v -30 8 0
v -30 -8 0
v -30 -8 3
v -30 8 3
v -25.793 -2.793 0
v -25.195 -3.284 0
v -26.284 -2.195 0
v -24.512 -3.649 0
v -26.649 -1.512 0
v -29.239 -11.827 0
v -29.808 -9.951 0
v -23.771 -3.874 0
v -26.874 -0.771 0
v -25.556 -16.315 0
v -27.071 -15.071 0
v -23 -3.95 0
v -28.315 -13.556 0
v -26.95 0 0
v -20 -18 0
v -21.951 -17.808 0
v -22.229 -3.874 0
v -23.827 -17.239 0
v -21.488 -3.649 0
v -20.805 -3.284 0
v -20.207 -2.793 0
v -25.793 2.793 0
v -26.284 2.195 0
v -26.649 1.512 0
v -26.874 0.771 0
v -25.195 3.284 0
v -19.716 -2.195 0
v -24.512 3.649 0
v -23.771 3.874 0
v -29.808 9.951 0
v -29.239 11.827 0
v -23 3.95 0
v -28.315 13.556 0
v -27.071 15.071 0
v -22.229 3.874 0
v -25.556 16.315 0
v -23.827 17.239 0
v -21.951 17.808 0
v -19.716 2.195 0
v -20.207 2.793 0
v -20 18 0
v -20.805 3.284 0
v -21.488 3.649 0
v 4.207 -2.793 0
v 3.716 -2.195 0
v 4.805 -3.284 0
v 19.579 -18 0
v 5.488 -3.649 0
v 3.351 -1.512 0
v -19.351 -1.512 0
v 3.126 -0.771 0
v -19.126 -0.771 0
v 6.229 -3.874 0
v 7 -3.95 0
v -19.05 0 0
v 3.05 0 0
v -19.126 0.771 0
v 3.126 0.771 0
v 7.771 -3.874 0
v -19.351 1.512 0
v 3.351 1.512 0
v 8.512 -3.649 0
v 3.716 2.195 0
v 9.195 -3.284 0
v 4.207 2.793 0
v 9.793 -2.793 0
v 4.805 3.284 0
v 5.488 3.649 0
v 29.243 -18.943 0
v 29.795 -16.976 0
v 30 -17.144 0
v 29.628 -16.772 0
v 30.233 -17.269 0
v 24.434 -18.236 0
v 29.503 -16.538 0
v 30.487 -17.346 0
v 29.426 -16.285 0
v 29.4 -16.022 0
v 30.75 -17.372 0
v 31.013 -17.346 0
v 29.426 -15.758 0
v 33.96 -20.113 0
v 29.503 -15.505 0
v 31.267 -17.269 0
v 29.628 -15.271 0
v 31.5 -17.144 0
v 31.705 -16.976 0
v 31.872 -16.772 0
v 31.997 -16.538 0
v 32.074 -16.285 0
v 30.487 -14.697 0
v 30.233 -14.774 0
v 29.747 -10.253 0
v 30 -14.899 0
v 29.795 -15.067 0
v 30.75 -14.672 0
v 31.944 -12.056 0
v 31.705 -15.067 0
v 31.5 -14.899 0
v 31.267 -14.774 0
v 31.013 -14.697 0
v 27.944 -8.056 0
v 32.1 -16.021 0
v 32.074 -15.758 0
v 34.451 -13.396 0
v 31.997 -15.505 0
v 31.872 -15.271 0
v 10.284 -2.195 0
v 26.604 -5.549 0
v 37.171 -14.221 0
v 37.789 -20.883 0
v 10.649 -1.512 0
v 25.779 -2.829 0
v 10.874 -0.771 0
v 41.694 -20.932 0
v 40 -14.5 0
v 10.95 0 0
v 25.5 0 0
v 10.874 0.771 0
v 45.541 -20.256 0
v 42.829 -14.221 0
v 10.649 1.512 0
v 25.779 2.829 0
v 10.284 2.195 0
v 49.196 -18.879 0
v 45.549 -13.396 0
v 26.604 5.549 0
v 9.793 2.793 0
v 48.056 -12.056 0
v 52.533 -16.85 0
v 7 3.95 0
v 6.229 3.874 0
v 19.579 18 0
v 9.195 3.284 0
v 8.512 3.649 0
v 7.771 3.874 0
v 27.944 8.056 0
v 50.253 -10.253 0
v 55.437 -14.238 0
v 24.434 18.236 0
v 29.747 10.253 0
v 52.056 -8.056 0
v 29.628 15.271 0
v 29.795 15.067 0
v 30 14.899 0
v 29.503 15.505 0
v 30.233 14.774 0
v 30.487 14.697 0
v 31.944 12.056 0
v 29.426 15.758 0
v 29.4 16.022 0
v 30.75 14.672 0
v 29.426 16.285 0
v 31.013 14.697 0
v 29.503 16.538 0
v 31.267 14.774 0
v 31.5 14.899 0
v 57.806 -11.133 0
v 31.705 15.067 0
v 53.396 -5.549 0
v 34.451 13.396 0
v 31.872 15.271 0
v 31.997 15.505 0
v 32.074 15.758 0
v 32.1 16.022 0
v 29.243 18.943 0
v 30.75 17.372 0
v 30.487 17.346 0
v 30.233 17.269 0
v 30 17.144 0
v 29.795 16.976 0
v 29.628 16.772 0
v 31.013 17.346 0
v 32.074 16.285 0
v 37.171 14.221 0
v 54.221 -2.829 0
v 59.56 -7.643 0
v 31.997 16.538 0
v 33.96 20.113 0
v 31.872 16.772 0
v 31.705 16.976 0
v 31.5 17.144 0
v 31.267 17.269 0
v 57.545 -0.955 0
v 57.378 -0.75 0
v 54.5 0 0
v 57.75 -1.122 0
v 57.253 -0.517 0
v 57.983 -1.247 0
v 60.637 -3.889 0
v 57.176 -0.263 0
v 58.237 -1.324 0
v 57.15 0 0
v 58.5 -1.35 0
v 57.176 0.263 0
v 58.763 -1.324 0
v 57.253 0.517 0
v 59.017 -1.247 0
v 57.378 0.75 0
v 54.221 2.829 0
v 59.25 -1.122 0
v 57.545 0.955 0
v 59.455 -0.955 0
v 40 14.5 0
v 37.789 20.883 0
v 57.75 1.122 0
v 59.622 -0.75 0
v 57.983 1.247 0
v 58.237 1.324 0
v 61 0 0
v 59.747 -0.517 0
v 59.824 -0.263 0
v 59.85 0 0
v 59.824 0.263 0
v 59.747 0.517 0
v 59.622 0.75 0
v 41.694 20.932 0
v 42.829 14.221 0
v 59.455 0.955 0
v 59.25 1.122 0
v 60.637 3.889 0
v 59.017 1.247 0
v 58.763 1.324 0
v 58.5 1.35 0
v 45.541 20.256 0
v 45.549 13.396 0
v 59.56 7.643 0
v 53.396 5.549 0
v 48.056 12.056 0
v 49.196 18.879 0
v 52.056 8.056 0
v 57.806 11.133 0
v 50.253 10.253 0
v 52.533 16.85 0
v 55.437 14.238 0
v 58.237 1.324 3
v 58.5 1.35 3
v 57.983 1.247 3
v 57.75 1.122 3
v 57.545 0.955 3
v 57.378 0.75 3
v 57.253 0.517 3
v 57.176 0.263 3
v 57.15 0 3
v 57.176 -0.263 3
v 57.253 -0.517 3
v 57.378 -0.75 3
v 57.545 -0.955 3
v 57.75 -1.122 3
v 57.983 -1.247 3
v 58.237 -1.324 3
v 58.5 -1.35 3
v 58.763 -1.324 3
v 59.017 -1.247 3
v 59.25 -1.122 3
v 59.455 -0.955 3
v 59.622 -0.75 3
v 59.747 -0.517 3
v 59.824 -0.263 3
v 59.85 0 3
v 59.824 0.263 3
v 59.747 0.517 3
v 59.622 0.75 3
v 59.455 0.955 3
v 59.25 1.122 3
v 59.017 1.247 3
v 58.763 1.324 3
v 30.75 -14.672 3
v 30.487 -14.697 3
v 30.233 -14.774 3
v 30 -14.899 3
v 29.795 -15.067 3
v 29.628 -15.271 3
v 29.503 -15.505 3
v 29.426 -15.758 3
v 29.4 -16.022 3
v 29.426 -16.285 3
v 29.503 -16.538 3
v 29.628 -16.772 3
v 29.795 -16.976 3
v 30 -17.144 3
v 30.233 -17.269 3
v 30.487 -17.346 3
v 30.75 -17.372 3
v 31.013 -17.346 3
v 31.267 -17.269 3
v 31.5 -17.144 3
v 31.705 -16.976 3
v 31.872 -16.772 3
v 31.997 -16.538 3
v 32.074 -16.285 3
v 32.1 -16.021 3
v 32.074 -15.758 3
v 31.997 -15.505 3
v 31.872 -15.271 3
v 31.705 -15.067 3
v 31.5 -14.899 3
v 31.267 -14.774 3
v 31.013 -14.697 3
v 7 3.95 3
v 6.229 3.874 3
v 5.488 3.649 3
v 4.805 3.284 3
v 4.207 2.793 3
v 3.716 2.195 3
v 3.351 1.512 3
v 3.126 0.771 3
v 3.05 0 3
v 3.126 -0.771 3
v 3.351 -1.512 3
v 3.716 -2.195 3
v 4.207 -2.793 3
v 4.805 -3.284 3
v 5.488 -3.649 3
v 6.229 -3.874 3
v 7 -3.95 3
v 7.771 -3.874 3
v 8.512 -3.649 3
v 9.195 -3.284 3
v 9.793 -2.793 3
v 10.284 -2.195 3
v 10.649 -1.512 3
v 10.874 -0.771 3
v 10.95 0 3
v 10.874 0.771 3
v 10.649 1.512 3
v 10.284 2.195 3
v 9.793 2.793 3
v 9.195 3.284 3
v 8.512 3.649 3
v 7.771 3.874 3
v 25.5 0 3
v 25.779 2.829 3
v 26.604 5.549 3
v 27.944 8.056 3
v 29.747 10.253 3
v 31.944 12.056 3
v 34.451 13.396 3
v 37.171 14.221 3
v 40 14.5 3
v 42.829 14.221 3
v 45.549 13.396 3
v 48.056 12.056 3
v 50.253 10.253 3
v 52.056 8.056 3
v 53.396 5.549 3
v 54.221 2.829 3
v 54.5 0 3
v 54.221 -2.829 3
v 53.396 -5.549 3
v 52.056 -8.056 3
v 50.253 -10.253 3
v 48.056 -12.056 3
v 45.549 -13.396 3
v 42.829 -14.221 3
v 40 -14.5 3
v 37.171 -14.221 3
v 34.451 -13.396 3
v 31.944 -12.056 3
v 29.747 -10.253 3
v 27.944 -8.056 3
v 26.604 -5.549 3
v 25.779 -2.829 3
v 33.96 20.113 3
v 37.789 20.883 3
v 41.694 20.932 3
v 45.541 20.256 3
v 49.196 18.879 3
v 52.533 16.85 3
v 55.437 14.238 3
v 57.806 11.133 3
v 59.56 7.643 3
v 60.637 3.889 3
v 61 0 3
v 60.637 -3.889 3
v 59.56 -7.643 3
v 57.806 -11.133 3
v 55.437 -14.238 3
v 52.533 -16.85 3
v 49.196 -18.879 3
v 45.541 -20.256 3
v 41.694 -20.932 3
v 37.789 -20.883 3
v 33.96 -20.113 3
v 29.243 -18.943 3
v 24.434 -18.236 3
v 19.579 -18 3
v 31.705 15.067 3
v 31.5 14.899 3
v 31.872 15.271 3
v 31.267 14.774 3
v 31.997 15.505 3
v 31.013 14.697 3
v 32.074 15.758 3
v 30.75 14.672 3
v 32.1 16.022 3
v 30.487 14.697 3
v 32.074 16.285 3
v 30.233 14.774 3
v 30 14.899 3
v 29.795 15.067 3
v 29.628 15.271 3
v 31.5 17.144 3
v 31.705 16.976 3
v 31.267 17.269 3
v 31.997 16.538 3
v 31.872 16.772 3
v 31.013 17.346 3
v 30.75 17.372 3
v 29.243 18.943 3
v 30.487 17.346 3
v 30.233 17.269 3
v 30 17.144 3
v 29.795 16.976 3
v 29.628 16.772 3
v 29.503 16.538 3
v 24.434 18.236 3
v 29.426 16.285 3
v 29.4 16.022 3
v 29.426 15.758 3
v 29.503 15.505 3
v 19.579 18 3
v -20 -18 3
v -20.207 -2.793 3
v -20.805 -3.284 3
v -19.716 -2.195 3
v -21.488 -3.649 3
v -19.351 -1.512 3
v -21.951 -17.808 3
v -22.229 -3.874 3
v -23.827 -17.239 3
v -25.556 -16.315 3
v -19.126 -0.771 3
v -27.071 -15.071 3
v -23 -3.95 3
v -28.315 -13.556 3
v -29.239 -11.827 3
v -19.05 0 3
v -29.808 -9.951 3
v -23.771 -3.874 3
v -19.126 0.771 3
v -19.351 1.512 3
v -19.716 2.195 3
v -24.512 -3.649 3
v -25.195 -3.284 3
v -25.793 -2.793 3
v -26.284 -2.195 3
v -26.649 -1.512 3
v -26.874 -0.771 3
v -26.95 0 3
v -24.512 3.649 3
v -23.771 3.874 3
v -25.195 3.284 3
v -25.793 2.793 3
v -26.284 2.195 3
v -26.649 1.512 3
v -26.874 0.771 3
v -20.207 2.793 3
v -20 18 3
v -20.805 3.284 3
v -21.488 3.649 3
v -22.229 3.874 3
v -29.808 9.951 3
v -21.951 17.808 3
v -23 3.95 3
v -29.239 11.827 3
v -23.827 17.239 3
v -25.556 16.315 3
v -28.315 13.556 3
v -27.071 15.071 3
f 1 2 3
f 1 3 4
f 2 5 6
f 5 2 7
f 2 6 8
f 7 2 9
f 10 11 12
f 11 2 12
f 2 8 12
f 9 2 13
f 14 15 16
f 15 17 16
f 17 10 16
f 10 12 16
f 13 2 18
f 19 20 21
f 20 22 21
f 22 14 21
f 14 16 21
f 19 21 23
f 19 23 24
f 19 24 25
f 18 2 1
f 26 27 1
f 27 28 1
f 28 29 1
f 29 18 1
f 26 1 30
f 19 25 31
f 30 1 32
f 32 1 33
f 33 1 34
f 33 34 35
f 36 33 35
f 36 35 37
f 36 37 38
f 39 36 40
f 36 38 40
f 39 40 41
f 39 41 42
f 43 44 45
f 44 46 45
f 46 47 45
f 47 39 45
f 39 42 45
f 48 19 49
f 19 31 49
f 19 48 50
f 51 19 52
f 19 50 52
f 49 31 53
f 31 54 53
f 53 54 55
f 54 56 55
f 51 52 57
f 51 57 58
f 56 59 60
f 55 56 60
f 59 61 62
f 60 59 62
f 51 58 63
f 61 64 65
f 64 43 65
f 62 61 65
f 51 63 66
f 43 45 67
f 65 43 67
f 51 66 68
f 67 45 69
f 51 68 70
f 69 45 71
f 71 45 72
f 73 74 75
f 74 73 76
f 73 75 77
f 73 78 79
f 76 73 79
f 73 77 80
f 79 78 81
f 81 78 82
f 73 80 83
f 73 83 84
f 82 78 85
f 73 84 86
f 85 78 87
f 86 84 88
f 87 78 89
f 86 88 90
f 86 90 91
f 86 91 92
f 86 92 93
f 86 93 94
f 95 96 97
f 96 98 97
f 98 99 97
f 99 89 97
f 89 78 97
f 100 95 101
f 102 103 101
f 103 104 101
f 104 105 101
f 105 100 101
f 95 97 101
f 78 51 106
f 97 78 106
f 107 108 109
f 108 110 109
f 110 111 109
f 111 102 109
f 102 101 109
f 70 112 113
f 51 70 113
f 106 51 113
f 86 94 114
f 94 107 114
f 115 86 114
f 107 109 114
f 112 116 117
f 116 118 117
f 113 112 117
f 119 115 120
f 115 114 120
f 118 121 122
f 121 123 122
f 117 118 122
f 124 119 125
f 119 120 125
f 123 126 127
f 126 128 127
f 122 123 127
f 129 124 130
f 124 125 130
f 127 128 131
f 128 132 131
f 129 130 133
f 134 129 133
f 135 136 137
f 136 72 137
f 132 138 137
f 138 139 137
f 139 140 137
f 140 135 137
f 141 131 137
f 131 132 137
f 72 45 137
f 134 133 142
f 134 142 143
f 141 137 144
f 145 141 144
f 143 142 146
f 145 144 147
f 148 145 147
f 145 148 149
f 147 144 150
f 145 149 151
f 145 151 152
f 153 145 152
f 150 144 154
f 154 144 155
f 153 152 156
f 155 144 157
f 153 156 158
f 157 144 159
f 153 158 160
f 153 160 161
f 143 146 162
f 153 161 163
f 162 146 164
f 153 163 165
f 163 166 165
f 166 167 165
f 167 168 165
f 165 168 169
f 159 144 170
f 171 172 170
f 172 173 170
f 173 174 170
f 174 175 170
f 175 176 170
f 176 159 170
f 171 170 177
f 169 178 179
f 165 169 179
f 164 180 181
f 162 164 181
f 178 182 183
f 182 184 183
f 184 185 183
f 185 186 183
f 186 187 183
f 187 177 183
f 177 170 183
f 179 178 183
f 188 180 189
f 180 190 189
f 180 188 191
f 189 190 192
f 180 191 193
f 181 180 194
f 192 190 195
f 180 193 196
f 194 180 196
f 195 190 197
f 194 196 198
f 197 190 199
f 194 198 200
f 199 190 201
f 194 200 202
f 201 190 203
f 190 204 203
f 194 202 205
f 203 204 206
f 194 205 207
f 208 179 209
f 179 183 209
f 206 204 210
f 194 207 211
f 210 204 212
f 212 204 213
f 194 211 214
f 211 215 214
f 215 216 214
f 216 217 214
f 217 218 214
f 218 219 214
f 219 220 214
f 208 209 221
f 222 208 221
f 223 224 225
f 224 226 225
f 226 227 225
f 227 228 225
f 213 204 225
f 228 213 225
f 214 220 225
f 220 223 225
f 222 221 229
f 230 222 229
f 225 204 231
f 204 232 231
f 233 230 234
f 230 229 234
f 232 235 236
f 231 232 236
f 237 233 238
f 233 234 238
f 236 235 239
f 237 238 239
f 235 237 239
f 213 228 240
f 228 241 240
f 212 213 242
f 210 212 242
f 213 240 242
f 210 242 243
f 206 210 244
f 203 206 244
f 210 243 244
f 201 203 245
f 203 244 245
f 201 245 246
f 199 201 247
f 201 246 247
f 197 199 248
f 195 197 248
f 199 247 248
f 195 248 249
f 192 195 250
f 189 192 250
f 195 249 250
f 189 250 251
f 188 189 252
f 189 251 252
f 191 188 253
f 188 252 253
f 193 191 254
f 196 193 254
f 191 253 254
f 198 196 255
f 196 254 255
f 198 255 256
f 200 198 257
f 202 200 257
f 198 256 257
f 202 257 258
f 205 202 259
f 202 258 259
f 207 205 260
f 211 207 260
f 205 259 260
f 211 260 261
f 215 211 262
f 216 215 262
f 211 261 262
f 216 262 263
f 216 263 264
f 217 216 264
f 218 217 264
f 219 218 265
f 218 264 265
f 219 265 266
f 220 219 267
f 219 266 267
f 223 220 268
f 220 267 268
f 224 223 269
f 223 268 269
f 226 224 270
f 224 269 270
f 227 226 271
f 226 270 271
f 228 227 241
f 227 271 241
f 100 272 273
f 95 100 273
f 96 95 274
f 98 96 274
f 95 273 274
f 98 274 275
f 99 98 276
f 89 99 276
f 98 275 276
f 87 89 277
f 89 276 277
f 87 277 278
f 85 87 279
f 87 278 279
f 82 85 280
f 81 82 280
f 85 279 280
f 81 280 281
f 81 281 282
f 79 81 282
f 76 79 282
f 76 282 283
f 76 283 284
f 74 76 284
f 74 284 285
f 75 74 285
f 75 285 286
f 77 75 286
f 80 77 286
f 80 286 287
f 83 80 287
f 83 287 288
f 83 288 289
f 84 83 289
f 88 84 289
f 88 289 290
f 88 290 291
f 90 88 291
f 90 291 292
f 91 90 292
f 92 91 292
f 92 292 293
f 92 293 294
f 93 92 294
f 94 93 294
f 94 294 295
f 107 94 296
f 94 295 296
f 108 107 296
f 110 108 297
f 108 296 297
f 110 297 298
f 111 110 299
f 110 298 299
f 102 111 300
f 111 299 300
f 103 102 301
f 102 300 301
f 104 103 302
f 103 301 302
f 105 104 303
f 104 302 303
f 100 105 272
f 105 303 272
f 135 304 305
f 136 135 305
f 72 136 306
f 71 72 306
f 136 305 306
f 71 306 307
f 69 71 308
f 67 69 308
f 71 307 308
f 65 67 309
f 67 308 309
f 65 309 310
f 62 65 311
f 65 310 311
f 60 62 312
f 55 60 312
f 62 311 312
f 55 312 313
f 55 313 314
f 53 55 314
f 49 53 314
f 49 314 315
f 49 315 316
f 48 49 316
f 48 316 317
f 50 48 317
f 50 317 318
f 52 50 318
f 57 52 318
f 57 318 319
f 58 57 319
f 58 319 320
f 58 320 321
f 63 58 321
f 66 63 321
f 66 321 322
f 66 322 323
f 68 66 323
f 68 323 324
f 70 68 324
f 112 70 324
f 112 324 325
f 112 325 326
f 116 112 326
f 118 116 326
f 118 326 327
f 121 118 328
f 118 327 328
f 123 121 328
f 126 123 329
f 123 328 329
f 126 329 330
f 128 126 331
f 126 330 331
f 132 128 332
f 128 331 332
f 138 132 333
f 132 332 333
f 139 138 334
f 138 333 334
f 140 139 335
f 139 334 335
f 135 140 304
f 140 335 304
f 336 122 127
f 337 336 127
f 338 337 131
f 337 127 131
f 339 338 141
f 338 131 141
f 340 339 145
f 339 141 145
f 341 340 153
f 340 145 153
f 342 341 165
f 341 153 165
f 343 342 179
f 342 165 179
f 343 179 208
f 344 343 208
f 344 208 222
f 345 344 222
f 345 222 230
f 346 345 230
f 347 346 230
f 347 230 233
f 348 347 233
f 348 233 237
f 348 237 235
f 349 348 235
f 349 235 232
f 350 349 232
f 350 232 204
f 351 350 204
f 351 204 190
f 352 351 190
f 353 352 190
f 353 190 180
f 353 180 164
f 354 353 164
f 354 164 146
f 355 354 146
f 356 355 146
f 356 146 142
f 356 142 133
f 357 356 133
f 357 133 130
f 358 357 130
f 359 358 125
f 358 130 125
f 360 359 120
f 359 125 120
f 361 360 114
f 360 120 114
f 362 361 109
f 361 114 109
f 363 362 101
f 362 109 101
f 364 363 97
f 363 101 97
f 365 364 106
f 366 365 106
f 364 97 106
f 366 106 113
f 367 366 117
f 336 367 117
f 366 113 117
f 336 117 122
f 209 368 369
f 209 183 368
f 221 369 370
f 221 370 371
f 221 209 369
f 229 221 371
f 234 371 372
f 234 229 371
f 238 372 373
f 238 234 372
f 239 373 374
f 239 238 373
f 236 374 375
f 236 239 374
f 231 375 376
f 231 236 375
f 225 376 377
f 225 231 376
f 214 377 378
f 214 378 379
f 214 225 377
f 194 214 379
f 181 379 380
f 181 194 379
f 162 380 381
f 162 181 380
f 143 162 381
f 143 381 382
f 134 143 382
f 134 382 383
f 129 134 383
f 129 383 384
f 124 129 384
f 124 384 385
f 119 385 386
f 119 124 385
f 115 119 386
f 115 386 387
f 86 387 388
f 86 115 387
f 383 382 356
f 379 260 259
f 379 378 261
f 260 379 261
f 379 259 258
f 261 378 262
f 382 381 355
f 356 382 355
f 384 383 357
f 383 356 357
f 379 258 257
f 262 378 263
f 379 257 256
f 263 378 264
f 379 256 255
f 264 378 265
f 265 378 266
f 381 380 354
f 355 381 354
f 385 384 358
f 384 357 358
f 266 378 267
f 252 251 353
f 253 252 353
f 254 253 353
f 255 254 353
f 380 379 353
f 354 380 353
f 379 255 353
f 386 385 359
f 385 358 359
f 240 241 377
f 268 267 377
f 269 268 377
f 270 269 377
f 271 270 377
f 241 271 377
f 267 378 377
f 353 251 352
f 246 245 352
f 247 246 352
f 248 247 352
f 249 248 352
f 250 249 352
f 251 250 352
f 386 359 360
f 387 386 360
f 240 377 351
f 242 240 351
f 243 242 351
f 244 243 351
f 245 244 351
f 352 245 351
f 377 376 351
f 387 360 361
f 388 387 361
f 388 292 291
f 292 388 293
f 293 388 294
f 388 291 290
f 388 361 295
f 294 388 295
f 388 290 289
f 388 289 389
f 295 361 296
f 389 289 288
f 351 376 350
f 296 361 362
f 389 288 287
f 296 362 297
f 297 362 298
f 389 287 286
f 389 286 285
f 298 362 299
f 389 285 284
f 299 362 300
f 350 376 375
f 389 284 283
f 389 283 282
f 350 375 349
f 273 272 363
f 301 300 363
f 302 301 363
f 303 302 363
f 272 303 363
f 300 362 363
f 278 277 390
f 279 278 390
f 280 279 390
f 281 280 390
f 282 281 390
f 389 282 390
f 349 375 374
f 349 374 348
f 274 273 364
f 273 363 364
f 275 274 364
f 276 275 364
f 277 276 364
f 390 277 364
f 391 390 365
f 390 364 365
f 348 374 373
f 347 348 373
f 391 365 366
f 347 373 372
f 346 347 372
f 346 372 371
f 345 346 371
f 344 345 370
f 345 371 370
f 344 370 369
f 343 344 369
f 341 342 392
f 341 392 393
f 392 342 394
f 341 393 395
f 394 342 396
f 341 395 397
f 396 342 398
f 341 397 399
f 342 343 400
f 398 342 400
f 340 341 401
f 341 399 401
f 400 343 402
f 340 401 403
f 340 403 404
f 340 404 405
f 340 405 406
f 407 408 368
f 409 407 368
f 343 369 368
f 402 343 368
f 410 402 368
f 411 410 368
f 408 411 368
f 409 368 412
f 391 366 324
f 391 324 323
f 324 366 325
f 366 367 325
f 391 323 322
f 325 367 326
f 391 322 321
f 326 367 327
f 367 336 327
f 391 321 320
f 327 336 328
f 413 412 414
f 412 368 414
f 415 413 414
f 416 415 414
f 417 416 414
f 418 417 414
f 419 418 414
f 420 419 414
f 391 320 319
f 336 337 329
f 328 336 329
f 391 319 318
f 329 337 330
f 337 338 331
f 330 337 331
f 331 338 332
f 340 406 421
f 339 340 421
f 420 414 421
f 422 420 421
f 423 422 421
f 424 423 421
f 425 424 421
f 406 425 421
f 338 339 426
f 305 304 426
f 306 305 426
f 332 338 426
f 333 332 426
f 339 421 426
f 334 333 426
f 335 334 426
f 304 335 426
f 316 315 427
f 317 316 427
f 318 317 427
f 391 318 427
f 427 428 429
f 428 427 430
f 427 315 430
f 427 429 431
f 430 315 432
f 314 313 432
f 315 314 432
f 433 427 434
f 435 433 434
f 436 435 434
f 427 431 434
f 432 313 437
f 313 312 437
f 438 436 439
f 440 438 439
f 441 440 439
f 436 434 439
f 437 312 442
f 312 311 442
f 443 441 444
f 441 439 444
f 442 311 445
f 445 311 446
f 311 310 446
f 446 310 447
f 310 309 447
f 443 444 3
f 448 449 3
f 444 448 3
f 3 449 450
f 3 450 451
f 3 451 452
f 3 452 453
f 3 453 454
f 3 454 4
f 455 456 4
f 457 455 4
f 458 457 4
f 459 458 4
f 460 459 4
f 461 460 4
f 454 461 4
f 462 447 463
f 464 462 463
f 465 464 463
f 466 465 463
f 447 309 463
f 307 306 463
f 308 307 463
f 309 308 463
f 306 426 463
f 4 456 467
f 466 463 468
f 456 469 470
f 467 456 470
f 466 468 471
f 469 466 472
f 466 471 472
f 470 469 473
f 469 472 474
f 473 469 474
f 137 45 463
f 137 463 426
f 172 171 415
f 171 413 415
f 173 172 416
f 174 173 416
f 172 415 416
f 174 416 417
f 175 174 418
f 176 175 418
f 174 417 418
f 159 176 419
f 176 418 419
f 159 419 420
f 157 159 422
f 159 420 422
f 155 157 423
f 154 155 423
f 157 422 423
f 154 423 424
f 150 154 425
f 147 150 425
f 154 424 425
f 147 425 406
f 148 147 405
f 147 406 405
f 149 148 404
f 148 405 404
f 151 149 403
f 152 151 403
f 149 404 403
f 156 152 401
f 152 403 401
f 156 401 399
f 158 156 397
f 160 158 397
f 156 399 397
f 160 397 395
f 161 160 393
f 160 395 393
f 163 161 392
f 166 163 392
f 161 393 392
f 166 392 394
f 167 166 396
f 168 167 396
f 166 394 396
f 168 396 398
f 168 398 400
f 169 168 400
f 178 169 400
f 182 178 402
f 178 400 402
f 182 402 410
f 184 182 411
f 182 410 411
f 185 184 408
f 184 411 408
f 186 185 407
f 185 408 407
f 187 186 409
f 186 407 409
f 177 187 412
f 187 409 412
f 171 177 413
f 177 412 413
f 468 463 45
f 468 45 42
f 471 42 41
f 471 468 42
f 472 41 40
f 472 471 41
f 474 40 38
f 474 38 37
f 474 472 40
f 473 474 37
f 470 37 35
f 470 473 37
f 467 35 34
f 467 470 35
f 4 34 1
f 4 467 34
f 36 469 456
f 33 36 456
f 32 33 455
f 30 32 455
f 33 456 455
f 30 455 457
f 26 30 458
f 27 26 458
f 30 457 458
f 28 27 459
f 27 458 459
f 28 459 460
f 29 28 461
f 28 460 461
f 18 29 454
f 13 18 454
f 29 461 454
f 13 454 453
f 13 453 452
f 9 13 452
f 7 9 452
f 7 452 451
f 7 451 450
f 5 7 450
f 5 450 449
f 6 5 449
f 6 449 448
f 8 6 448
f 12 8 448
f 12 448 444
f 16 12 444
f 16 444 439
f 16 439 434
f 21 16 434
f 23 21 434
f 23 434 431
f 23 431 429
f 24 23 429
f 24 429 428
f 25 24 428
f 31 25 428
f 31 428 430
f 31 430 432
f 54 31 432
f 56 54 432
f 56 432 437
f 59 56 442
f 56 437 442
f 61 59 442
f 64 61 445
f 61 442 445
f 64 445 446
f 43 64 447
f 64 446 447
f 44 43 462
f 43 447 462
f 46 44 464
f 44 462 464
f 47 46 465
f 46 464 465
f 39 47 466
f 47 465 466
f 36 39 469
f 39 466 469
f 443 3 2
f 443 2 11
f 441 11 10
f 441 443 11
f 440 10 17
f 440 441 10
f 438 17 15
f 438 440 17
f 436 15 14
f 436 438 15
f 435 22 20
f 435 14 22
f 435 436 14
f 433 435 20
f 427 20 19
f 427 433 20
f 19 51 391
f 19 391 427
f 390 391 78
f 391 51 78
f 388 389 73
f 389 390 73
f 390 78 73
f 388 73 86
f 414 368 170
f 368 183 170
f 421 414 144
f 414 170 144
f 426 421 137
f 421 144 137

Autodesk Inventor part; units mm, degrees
ref_plane "YZ Plane" through (0, 0, 0) normal (1, 0, 0) x (0, 1, 0)
ref_plane "XZ Plane" through (0, 0, 0) normal (0, 1, 0) x (-1, 0, 0)
ref_plane "XY Plane" through (0, 0, 0) normal (0, 0, 1) x (1, 0, 0)
sketch "スケッチ1" plane through (0, 0, 0) normal (0, 0, 1) x (1, 0, 0)
  line L0 (-30, 18) -> (30, 18)
  line L1 (30, 18) -> (30, -18)
  line L2 (30, -18) -> (-30, -18)
  line L3 (-30, -18) -> (-30, 18)
  line L4 (0, 0) -> (0, 18) construction
  line L5 (0, 0) -> (30, 0) construction
  dimension "d0" = 36
  dimension "d1" = 60
extrude "プレート1" add sketch "スケッチ1" along normal blind 3
sketch "スケッチ13" plane through (0, 0, 0) normal (0, 0, -1) x (-1, 0, 0)
  line L0 (0, 0) -> (30, 0) construction
  line L1 (30, -18) -> (30, 18) projected
  line L2 (-30, 18) -> (-30, -18) projected
  point P0 (23, 0)
  point P1 (-7, 0)
  dimension "d127" = 30
  dimension "d129" = 7
hole "穴10" at (-23, 0, 0) at (7, 0, 0) direction (0, 0, 1) diameter 7.9 depth 3
sketch "スケッチ15" plane through (0, 0, 0) normal (0, 0, -1) x (-1, 0, 0)
  circle A0 centre (-40, 0) radius 21
  line L0 (-30, -18) -> (-30, 18) projected
  point P0 (0, 0)
  dimension "d130" = 42
  dimension "d131" = 10
extrude "押し出し1" add sketch "スケッチ15" against normal up to surface (3 mm away)
fillet "フィレット1" radius 10 2 edges at (-30, 18, 1.5) (-30, -18, 1.5)
sketch "スケッチ16" plane through (0, 0, 0) normal (0, 0, -1) x (-1, 0, 0)
  arc A0 (-29.1833, 18) -> (-29.1833, -18) centre (-40, 0) ccw projected
  circle A1 centre (-40, 0) radius 14.5
  point P0 (0, 0)
  dimension "d134" = 29
extrude "押し出し2" cut sketch "スケッチ16" against normal up to surface (3 mm away)
sketch "スケッチ17" plane through (0, 0, 0) normal (0, 0, -1) x (-1, 0, 0)
  circle A0 centre (-40, 0) radius 14.5 projected
  line L0 (-40, 0) -> (-61, 0) construction
  arc A1 (-29.1833, 18) -> (-29.1833, -18) centre (-40, 0) ccw projected
  point P0 (0, 0)
  point P1 (-58.5, 0)
  point P2 (-30.75, -16.0215)
  point P3 (-30.75, 16.0215)
  dimension "d137" = 18.5
  dimension "d140" = 360
hole "穴11" at (58.5, 0, 0) at (30.75, -16.0215, 0) at (30.75, 16.0215, 0) direction (0, 0, 1) diameter 2.7 depth 3
fillet "フィレット3" radius 50 2 edges at (29.1833, 18, 1.5) (29.1833, -18, 1.5)
equation "\"d125\" = Thickness"
equation "\"d147\" = Thickness"
equation "\"d2\" = Thickness"
equation "\"BendRadius\" = Thickness"
equation "\"BendReliefWidth\" = Thickness"
equation "\"BendReliefDepth\" = 0.5 * Thickness"
equation "\"CornerReliefSize\" = 4 * Thickness"
equation "\"MinimumRemnant\" = 2 * Thickness"
equation "\"TransitionRadius\" = BendRadius"
equation "\"JacobiRadiusSize\" = BendRadius"
equation "\"GapSize\" = Thickness"
equation "\"Thickness\" = 3"
properties part number "wrist_pitch_plate" material "アルミニウム 6061"
